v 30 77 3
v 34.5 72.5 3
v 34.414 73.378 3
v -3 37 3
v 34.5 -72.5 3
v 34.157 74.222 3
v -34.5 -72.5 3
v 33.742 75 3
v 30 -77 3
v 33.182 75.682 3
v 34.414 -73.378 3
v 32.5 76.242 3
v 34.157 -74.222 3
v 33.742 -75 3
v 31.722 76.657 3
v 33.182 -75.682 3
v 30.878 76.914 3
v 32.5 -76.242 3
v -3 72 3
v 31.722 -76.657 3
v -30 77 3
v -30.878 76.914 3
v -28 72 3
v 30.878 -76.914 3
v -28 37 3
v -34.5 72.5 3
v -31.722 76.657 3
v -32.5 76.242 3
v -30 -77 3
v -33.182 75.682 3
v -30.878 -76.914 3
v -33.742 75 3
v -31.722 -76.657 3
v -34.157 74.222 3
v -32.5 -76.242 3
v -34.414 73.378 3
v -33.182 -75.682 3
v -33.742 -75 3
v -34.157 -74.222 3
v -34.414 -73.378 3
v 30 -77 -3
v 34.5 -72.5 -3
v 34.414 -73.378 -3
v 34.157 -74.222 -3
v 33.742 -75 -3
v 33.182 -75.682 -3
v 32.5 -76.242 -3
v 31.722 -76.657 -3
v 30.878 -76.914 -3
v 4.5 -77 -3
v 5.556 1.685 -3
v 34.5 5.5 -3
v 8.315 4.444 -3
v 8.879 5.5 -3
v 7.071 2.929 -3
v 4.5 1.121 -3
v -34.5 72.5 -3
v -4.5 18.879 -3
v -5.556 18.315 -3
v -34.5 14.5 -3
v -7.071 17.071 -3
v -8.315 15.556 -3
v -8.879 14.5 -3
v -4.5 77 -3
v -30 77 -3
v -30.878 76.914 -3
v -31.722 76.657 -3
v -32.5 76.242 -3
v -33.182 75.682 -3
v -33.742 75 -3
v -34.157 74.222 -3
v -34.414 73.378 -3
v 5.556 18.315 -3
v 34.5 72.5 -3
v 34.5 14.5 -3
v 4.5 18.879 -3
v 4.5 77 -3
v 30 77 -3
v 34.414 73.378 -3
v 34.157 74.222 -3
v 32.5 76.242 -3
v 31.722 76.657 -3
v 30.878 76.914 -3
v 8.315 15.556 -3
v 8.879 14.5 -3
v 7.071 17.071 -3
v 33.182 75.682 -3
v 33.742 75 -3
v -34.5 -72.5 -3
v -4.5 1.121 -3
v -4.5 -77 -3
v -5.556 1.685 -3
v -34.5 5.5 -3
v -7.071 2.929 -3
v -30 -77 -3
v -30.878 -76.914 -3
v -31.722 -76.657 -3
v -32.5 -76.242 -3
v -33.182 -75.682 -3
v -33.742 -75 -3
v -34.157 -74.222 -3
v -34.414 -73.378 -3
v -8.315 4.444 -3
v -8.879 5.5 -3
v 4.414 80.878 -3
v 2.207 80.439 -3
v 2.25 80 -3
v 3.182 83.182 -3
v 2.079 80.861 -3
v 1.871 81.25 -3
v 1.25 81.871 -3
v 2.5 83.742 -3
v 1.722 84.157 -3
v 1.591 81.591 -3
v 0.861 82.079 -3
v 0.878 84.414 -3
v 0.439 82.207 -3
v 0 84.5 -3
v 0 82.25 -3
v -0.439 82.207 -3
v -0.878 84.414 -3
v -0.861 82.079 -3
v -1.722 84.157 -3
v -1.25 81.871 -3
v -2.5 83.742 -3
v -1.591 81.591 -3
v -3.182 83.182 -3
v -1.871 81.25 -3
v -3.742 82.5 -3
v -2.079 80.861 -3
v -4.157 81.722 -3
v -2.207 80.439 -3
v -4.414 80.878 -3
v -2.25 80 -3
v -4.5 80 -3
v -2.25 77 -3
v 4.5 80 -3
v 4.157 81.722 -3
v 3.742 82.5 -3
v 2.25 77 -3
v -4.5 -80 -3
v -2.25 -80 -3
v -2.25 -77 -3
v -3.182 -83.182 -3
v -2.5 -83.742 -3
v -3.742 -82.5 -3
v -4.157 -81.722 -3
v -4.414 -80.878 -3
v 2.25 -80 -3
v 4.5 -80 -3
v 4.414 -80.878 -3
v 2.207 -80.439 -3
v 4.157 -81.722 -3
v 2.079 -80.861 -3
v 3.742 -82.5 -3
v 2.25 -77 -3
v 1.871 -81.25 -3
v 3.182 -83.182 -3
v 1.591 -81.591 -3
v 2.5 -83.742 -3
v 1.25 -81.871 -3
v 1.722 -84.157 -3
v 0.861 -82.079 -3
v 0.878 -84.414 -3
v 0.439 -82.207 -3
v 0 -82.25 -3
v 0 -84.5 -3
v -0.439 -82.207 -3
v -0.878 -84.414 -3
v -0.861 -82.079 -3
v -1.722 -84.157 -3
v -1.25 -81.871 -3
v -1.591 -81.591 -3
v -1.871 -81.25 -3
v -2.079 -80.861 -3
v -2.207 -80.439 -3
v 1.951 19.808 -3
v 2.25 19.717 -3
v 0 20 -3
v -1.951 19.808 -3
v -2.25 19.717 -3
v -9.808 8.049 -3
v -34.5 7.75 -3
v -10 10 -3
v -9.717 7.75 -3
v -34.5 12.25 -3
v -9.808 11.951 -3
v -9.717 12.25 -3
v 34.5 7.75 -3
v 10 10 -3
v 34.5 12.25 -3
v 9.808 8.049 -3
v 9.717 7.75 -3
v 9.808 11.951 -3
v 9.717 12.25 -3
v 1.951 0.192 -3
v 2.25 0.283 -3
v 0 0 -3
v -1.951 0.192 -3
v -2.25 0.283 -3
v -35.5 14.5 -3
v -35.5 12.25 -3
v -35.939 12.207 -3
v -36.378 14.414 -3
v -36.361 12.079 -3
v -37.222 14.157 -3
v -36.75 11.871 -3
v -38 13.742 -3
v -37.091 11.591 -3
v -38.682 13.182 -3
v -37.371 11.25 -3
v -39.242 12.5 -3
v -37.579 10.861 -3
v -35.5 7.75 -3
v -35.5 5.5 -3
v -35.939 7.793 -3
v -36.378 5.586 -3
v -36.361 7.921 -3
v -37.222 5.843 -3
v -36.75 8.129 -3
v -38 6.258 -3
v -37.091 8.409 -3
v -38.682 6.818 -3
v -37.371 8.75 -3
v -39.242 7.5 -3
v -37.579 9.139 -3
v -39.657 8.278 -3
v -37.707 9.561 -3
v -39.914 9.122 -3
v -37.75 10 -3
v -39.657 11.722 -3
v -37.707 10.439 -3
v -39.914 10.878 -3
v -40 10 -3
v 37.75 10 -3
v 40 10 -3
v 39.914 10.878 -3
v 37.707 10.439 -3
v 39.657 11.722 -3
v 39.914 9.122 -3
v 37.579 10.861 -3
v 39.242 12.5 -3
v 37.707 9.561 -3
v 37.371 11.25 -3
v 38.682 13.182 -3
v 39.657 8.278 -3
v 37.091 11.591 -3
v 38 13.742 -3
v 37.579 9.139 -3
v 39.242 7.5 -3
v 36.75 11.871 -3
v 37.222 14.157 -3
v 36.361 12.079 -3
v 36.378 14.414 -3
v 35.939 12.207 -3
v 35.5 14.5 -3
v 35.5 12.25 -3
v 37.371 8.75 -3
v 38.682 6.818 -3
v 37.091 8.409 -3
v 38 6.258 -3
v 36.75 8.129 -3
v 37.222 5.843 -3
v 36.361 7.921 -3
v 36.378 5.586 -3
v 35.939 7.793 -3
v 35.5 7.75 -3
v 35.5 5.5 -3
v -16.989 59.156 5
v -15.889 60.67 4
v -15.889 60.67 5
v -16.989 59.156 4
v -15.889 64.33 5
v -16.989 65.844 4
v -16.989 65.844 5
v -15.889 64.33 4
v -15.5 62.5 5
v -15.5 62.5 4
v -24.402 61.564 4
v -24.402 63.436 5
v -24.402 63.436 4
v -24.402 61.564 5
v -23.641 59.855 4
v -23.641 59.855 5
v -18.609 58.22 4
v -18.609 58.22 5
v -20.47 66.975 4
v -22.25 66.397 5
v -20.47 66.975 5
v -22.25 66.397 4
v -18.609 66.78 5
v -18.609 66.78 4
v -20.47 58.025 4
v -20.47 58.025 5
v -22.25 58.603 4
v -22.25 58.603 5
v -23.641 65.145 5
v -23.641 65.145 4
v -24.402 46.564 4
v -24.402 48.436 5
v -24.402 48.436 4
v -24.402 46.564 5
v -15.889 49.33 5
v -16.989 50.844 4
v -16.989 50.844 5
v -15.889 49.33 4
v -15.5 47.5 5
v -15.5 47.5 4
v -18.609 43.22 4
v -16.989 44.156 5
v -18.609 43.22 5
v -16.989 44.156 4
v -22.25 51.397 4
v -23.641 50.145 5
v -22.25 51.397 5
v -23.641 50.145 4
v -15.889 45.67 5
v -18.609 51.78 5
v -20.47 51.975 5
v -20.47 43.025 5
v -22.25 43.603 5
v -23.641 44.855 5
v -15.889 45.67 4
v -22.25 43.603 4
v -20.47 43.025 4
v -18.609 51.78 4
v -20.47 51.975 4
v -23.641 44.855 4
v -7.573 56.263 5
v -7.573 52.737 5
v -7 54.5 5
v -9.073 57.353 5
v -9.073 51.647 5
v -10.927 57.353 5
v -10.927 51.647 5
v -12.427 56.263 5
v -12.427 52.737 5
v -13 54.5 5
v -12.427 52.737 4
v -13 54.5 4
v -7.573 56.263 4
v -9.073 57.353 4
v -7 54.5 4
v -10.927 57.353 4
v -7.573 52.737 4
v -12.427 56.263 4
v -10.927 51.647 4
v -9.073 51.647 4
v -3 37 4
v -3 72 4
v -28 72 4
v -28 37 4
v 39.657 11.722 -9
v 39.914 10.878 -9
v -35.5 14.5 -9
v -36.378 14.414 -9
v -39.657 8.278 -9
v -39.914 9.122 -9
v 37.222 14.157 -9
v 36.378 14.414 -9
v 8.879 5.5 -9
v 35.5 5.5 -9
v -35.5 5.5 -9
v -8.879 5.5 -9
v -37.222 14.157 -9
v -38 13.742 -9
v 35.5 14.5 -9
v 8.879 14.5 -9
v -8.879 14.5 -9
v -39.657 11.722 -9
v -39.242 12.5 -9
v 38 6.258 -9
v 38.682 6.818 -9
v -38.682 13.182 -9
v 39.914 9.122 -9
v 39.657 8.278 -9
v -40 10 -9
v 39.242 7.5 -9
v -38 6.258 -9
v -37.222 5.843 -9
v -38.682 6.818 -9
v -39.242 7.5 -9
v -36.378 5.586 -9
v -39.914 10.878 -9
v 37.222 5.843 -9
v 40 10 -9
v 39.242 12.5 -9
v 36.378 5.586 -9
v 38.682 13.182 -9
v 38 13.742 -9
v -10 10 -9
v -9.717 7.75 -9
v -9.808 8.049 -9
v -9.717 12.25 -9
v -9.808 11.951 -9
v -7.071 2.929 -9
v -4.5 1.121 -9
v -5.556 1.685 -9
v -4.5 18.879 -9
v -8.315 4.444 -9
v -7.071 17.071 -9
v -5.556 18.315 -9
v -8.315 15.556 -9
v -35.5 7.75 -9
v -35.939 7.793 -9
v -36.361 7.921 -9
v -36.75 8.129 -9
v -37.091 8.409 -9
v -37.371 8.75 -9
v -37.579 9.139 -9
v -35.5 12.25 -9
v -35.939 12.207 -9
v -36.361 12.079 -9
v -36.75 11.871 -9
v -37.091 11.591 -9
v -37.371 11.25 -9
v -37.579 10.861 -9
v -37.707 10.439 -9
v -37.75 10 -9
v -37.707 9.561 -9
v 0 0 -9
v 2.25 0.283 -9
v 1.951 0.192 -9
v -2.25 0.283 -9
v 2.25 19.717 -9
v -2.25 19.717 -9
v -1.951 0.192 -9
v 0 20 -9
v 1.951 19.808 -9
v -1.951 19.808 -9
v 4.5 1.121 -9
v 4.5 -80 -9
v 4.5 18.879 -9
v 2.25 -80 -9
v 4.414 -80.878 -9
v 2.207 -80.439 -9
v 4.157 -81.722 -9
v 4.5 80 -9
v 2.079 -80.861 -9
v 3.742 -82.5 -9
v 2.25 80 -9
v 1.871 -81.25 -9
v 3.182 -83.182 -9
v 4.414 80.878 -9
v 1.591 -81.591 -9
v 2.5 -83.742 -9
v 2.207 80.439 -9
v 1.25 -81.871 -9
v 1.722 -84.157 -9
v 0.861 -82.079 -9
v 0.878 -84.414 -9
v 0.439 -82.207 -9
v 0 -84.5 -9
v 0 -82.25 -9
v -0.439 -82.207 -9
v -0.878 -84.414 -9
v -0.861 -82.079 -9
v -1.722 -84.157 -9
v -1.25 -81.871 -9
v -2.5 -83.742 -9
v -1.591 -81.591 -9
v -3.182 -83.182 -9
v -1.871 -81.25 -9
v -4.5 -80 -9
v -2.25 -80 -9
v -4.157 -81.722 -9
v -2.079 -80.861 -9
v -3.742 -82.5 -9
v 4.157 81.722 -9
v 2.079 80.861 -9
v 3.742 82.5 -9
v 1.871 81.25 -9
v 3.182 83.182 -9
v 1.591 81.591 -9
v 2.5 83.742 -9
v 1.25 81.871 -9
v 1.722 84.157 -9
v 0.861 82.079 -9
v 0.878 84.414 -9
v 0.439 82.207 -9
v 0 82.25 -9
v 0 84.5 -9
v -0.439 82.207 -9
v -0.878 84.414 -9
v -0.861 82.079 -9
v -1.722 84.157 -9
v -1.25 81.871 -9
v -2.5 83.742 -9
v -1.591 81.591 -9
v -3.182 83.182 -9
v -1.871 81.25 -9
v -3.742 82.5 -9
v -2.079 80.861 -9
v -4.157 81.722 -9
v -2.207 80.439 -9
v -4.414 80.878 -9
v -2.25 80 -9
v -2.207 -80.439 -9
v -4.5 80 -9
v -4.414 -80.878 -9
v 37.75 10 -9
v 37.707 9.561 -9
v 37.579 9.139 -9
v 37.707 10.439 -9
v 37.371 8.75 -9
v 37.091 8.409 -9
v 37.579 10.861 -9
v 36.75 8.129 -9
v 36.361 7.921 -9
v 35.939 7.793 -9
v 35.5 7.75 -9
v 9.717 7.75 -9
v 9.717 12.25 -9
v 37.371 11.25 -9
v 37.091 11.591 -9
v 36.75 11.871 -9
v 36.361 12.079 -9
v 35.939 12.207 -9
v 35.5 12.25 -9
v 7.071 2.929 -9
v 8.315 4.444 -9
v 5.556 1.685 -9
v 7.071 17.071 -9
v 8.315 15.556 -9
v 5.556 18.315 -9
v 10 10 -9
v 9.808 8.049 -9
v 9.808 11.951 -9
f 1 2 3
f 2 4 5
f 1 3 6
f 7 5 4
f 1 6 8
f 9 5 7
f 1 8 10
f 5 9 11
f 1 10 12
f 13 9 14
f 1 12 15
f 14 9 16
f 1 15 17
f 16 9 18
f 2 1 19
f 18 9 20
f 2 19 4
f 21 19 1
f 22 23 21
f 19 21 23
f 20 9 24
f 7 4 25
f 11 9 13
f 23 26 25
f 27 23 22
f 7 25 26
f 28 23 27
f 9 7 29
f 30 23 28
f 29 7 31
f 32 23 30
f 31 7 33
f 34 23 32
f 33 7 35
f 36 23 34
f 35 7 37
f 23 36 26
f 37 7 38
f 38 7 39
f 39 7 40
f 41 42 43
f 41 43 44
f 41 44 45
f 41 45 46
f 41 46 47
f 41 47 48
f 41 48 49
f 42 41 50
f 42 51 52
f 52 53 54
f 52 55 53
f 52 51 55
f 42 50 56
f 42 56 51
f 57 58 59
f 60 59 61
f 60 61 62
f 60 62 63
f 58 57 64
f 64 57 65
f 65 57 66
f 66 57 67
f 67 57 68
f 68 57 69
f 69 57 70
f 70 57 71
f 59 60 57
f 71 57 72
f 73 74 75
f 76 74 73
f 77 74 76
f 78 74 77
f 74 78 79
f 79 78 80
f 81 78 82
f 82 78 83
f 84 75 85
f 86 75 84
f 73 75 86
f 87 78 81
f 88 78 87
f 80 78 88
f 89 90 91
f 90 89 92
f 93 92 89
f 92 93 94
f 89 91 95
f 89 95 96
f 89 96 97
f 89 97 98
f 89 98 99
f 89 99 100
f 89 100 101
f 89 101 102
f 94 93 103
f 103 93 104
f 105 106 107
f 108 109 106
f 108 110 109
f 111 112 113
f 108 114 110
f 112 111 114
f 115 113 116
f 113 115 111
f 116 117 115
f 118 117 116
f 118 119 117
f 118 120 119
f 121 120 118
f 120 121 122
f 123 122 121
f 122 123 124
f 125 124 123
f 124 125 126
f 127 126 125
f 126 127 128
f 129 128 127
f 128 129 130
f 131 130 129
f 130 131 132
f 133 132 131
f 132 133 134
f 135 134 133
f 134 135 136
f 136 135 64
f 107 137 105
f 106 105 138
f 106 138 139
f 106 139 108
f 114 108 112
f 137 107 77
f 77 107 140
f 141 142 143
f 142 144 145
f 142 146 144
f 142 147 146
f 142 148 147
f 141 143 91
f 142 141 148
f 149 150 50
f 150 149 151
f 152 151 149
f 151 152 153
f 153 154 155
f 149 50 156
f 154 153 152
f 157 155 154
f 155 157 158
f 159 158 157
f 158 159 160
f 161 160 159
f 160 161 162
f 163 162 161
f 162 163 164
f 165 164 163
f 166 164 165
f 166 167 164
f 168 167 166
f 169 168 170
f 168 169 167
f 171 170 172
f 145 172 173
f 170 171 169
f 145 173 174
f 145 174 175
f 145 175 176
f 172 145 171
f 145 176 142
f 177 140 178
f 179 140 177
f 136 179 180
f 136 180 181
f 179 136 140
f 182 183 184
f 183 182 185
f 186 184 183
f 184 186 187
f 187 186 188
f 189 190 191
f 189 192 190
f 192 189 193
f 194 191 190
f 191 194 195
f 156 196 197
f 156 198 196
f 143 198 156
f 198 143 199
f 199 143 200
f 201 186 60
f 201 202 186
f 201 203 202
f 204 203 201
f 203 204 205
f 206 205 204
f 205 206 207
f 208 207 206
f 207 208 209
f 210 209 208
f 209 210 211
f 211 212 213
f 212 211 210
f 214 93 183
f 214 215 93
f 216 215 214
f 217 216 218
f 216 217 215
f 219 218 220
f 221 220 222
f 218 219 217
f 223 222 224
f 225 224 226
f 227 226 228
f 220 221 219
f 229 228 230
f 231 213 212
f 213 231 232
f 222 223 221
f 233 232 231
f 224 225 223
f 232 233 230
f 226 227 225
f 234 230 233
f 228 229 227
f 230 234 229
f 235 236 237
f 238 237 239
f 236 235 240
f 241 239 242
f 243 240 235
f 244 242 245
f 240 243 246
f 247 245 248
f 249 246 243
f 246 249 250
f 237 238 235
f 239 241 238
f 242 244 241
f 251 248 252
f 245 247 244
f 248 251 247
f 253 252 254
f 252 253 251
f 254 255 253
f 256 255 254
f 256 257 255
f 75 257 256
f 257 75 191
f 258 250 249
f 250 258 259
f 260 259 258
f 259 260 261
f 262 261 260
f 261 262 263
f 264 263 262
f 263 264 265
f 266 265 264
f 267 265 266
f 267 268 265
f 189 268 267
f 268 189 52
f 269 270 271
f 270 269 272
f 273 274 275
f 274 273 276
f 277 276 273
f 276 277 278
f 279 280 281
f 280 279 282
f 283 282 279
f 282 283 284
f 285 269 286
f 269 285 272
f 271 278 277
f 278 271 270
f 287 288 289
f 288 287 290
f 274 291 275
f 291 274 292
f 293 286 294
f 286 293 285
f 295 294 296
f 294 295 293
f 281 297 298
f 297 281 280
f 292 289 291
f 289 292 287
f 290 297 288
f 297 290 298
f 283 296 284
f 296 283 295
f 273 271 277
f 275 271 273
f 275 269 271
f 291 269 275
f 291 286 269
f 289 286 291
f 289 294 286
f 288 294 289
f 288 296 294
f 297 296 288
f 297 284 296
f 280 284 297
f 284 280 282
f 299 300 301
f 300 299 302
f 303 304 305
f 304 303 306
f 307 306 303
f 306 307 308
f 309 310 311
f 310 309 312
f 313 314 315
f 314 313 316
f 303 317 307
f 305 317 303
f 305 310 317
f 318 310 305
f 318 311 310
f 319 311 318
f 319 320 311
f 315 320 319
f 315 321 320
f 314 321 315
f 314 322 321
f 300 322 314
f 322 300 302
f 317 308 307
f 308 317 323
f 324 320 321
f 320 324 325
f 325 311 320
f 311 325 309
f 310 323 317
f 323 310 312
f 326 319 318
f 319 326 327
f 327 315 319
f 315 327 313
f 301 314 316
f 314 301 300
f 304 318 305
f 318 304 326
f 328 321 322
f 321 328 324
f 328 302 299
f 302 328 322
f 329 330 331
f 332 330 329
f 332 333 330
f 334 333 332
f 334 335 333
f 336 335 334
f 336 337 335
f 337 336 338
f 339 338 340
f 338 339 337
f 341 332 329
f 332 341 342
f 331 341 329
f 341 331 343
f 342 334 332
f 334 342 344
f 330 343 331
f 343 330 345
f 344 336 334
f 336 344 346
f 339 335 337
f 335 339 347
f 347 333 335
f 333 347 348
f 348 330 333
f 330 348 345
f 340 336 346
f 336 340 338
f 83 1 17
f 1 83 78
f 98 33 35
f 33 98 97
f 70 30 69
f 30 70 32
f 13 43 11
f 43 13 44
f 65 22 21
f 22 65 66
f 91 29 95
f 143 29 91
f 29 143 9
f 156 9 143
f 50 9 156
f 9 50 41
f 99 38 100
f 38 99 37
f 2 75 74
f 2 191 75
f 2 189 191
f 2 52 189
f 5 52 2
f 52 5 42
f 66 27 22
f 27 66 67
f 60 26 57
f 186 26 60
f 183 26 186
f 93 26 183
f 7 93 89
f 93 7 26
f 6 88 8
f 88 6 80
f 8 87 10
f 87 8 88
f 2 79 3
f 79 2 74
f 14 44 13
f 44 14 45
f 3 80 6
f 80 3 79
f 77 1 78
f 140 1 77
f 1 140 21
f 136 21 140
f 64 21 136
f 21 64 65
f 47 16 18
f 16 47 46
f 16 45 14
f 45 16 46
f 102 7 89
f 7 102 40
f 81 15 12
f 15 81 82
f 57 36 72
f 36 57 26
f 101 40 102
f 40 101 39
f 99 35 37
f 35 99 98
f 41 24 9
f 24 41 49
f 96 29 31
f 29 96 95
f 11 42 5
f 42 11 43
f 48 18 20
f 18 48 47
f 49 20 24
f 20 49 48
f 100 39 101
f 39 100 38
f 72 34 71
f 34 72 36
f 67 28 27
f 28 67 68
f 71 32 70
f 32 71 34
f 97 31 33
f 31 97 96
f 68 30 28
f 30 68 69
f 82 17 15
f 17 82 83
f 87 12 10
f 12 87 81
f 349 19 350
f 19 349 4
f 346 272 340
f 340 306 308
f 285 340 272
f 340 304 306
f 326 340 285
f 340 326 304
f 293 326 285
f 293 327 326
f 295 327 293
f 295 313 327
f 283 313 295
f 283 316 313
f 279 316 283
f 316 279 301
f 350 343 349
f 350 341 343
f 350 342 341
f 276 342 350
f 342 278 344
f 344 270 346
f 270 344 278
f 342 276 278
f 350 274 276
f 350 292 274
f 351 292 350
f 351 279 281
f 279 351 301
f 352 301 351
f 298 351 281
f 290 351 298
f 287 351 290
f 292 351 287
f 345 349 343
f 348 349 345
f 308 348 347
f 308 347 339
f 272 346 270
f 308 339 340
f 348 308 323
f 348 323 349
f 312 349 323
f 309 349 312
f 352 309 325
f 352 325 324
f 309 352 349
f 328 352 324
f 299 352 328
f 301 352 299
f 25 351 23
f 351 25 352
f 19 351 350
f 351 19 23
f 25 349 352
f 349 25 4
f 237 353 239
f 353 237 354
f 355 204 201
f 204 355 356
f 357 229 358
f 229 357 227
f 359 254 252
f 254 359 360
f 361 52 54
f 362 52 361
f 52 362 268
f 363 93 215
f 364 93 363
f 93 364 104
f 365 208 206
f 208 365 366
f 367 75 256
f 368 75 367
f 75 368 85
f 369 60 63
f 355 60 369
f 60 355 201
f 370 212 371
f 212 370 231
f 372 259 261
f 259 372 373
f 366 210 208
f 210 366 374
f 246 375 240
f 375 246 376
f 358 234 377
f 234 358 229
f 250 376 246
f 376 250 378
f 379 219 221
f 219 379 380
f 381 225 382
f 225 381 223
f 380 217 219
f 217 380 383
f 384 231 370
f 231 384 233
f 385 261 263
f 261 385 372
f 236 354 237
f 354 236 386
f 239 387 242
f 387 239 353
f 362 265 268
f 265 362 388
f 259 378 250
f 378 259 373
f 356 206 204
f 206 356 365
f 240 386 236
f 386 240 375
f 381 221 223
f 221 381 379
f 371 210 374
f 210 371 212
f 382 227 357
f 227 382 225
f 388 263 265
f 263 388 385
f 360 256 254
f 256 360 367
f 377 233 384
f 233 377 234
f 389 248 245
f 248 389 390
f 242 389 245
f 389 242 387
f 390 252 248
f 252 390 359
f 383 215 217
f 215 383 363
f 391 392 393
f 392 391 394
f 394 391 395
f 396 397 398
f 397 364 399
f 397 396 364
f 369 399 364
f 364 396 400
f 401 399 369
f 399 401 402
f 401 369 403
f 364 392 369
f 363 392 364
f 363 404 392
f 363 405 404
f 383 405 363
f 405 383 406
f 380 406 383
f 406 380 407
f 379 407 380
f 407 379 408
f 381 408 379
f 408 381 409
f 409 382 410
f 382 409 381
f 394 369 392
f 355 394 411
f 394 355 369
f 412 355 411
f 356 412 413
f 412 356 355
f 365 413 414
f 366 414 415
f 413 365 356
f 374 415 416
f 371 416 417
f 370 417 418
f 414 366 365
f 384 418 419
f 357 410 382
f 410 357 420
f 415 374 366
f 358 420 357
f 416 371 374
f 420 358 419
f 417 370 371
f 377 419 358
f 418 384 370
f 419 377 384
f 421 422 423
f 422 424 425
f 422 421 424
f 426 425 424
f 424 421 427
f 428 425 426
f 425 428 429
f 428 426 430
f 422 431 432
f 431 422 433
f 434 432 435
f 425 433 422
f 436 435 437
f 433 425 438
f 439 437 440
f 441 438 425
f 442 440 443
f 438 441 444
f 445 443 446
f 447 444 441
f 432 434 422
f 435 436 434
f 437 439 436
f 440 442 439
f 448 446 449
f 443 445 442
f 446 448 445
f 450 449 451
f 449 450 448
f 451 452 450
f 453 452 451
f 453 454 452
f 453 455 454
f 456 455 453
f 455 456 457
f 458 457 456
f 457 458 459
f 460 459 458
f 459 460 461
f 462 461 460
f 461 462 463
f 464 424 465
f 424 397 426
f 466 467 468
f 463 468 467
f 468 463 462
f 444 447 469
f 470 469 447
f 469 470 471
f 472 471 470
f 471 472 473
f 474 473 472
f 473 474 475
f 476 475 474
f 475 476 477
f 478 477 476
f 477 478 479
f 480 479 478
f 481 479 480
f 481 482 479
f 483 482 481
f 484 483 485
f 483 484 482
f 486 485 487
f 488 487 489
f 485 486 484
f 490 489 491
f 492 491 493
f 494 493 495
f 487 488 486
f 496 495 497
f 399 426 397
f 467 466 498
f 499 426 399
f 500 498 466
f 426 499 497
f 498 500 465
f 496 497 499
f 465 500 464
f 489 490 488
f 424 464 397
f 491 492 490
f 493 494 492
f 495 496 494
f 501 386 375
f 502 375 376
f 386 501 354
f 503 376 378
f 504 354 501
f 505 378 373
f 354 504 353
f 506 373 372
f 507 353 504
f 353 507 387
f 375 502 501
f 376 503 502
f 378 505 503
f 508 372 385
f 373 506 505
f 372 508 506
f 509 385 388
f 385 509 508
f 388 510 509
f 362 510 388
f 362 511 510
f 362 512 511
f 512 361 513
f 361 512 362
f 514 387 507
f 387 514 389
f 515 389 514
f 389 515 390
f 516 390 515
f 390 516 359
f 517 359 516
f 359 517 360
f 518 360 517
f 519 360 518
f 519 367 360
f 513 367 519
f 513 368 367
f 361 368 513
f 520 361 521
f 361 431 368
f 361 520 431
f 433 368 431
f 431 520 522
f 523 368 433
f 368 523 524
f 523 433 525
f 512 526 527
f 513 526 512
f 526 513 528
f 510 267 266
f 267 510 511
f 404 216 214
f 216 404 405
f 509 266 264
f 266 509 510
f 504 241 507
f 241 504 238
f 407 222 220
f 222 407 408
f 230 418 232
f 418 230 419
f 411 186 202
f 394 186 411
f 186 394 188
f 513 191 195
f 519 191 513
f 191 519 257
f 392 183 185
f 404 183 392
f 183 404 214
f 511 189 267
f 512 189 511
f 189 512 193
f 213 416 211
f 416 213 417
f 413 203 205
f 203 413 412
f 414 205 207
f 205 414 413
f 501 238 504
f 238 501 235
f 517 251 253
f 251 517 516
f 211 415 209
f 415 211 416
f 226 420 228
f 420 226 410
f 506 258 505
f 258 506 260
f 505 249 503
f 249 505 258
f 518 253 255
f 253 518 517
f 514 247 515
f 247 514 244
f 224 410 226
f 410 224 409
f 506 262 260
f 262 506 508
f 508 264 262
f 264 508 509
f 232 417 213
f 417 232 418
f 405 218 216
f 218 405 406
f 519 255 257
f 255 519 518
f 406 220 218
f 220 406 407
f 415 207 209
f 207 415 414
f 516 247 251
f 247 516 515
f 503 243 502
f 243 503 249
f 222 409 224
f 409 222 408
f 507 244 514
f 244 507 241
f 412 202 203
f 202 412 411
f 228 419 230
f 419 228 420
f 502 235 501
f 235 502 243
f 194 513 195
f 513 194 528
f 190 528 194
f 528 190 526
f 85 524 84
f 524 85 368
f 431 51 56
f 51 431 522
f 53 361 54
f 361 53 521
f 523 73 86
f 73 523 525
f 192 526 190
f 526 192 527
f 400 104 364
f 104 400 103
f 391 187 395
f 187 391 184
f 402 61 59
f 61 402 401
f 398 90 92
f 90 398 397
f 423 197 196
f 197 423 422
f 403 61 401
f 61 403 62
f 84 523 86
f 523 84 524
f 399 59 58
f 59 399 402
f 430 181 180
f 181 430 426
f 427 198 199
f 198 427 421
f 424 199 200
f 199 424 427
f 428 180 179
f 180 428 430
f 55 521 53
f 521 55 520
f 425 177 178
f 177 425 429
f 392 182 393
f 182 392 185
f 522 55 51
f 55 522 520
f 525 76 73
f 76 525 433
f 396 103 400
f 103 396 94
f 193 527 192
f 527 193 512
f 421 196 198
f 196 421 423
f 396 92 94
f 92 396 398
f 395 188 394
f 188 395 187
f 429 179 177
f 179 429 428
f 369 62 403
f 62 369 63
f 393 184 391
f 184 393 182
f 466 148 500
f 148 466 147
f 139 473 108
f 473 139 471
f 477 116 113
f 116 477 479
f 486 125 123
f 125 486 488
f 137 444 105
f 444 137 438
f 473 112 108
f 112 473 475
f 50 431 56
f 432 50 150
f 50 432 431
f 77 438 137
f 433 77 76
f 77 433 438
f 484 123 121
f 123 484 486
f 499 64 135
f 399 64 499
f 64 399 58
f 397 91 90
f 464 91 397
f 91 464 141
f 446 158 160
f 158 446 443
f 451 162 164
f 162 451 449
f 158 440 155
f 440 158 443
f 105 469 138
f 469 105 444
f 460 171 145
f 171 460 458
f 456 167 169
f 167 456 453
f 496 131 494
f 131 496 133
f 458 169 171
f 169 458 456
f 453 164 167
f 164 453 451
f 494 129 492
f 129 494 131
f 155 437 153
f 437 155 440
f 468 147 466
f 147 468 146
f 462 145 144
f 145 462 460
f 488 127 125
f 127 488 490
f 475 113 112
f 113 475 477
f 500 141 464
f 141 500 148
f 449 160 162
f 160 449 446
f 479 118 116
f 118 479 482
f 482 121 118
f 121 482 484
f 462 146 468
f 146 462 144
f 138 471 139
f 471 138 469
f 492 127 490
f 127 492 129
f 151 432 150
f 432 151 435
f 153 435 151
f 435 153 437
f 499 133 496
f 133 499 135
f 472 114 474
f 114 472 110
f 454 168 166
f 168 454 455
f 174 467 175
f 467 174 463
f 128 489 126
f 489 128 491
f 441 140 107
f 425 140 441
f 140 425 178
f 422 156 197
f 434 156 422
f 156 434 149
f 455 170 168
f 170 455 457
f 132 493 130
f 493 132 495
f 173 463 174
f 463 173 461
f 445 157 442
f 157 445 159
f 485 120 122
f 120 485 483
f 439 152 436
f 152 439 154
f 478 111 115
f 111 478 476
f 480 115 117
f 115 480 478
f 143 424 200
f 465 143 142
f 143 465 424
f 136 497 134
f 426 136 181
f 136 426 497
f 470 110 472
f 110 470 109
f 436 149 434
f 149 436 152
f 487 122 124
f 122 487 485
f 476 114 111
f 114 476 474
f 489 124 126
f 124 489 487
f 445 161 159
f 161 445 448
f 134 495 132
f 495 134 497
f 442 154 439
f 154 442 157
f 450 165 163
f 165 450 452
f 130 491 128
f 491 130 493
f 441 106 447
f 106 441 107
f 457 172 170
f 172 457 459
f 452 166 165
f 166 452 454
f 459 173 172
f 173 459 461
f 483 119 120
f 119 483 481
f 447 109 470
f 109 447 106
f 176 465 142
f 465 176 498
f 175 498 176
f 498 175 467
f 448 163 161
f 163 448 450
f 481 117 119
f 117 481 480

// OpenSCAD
// file: holder.scad
len_phone = 145;
d_screw_m4 = 4.5;
width_phone = 56;
thikness_holder = 6;
append = 15;

holder_set();

module horizontal_block(len_block, offset_vertical) {
    len_block = len_block + append;
    
    translate([0, offset_vertical, 0])
    cylinder(d=20, h=thikness_holder, center=true, $fn=32);
    
    difference() {
        hull() {
            translate([len_block/2, offset_vertical, 0])
            cylinder(d=9, h=thikness_holder, center=true, $fn=32);
            
            translate([-len_block/2, offset_vertical, 0])
            cylinder(d=9, h=thikness_holder, center=true, $fn=32);
        }
        color("red")
        hull() {
            translate([len_block/2, offset_vertical, 0])
            cylinder(d=d_screw_m4, h=thikness_holder+2, center=true, $fn=32);
            
            translate([-len_block/2, offset_vertical, 0])
            cylinder(d=d_screw_m4, h=thikness_holder+2, center=true, $fn=32);
        }
    }
}

vertical_block(len_phone);

module vertical_block(len_block) {
    len_block = len_block + append;
    
        difference() {
            hull() {
                //translate([0, -len_phone/2, 0])
                translate([0, -len_block/2, 0])
                cylinder(d=9, h=thikness_holder, center=true, $fn=32);
                
                //translate([0, -len_phone/2, 0])
                translate([0, len_block/2, 0])
                cylinder(d=9, h=thikness_holder, center=true, $fn=32);
            }
            color("red")
            hull() {
                //translate([0, -len_phone/2, 0])
                translate([0, -len_block/2, 0])
                cylinder(d=d_screw_m4, h=thikness_holder+2, center=true, $fn=32);
                
                //translate([0, -len_phone/2, 0])
                translate([0, len_block/2, 0])
                cylinder(d=d_screw_m4, h=thikness_holder+2, center=true, $fn=32);
        }
    }
}

module holder_set() {
    horizontal_block(len_block=width_phone, offset_vertical=10);
    vertical_block(len_block=len_phone);
}
// file: smartphone.scad
echo("Работа Павла Юнкер");
len_phone = 145;
width_phone = 60;
thickness_phone = 6;

corner_round = 9;

module camera() {
    cube([width_phone, len_phone, thickness_phone], center=true);

    color("blue")
    translate([width_phone/2-50, len_phone/2-10, 0])
    cylinder(d=9, h = thickness_phone - 1);

    color("blue")
    translate([width_phone/2-50, len_phone/2-25, 0])
    cylinder(d=9, h = thickness_phone - 1);

    color("blue")
    translate([width_phone/2-40, len_phone/2-18, 0])
    cylinder(d=6, h = thickness_phone - 1);
}

module smartphone_block() {
    hull() {
        color("red")
        translate([width_phone/2, len_phone/2, 0])
        cylinder(h=thickness_phone, d=corner_round, $fn=32, center=true);

        mirror([1,0,0])
        color("red")
        translate([width_phone/2, len_phone/2, 0])
        cylinder(h=thickness_phone, d=corner_round, $fn=32, center=true);

        mirror([0,1,0])
        color("red")
        translate([width_phone/2, len_phone/2, 0])
        cylinder(h=thickness_phone, d=corner_round, $fn=32, center=true);

        mirror([1,0,0])
        mirror([0,1,0])
        color("red")
        translate([width_phone/2, len_phone/2, 0])
        cylinder(h=thickness_phone, d=corner_round, $fn=32, center=true);
    }
}

h = 3;

module smartphone() {
    smartphone_block();
    camera();
    color("red")
    translate([-28, 37, 2])
    cube([25, 35, 2]);
}

smartphone();
// main file
use <smartphone.scad>
use <holder.scad>

thickness_phone = 8;
thickness_holder = 4;

echo("Работа Павла Юнкер");

smartphone();
translate([0, 0, -thickness_phone/2-thickness_holder/2])
holder_set();
